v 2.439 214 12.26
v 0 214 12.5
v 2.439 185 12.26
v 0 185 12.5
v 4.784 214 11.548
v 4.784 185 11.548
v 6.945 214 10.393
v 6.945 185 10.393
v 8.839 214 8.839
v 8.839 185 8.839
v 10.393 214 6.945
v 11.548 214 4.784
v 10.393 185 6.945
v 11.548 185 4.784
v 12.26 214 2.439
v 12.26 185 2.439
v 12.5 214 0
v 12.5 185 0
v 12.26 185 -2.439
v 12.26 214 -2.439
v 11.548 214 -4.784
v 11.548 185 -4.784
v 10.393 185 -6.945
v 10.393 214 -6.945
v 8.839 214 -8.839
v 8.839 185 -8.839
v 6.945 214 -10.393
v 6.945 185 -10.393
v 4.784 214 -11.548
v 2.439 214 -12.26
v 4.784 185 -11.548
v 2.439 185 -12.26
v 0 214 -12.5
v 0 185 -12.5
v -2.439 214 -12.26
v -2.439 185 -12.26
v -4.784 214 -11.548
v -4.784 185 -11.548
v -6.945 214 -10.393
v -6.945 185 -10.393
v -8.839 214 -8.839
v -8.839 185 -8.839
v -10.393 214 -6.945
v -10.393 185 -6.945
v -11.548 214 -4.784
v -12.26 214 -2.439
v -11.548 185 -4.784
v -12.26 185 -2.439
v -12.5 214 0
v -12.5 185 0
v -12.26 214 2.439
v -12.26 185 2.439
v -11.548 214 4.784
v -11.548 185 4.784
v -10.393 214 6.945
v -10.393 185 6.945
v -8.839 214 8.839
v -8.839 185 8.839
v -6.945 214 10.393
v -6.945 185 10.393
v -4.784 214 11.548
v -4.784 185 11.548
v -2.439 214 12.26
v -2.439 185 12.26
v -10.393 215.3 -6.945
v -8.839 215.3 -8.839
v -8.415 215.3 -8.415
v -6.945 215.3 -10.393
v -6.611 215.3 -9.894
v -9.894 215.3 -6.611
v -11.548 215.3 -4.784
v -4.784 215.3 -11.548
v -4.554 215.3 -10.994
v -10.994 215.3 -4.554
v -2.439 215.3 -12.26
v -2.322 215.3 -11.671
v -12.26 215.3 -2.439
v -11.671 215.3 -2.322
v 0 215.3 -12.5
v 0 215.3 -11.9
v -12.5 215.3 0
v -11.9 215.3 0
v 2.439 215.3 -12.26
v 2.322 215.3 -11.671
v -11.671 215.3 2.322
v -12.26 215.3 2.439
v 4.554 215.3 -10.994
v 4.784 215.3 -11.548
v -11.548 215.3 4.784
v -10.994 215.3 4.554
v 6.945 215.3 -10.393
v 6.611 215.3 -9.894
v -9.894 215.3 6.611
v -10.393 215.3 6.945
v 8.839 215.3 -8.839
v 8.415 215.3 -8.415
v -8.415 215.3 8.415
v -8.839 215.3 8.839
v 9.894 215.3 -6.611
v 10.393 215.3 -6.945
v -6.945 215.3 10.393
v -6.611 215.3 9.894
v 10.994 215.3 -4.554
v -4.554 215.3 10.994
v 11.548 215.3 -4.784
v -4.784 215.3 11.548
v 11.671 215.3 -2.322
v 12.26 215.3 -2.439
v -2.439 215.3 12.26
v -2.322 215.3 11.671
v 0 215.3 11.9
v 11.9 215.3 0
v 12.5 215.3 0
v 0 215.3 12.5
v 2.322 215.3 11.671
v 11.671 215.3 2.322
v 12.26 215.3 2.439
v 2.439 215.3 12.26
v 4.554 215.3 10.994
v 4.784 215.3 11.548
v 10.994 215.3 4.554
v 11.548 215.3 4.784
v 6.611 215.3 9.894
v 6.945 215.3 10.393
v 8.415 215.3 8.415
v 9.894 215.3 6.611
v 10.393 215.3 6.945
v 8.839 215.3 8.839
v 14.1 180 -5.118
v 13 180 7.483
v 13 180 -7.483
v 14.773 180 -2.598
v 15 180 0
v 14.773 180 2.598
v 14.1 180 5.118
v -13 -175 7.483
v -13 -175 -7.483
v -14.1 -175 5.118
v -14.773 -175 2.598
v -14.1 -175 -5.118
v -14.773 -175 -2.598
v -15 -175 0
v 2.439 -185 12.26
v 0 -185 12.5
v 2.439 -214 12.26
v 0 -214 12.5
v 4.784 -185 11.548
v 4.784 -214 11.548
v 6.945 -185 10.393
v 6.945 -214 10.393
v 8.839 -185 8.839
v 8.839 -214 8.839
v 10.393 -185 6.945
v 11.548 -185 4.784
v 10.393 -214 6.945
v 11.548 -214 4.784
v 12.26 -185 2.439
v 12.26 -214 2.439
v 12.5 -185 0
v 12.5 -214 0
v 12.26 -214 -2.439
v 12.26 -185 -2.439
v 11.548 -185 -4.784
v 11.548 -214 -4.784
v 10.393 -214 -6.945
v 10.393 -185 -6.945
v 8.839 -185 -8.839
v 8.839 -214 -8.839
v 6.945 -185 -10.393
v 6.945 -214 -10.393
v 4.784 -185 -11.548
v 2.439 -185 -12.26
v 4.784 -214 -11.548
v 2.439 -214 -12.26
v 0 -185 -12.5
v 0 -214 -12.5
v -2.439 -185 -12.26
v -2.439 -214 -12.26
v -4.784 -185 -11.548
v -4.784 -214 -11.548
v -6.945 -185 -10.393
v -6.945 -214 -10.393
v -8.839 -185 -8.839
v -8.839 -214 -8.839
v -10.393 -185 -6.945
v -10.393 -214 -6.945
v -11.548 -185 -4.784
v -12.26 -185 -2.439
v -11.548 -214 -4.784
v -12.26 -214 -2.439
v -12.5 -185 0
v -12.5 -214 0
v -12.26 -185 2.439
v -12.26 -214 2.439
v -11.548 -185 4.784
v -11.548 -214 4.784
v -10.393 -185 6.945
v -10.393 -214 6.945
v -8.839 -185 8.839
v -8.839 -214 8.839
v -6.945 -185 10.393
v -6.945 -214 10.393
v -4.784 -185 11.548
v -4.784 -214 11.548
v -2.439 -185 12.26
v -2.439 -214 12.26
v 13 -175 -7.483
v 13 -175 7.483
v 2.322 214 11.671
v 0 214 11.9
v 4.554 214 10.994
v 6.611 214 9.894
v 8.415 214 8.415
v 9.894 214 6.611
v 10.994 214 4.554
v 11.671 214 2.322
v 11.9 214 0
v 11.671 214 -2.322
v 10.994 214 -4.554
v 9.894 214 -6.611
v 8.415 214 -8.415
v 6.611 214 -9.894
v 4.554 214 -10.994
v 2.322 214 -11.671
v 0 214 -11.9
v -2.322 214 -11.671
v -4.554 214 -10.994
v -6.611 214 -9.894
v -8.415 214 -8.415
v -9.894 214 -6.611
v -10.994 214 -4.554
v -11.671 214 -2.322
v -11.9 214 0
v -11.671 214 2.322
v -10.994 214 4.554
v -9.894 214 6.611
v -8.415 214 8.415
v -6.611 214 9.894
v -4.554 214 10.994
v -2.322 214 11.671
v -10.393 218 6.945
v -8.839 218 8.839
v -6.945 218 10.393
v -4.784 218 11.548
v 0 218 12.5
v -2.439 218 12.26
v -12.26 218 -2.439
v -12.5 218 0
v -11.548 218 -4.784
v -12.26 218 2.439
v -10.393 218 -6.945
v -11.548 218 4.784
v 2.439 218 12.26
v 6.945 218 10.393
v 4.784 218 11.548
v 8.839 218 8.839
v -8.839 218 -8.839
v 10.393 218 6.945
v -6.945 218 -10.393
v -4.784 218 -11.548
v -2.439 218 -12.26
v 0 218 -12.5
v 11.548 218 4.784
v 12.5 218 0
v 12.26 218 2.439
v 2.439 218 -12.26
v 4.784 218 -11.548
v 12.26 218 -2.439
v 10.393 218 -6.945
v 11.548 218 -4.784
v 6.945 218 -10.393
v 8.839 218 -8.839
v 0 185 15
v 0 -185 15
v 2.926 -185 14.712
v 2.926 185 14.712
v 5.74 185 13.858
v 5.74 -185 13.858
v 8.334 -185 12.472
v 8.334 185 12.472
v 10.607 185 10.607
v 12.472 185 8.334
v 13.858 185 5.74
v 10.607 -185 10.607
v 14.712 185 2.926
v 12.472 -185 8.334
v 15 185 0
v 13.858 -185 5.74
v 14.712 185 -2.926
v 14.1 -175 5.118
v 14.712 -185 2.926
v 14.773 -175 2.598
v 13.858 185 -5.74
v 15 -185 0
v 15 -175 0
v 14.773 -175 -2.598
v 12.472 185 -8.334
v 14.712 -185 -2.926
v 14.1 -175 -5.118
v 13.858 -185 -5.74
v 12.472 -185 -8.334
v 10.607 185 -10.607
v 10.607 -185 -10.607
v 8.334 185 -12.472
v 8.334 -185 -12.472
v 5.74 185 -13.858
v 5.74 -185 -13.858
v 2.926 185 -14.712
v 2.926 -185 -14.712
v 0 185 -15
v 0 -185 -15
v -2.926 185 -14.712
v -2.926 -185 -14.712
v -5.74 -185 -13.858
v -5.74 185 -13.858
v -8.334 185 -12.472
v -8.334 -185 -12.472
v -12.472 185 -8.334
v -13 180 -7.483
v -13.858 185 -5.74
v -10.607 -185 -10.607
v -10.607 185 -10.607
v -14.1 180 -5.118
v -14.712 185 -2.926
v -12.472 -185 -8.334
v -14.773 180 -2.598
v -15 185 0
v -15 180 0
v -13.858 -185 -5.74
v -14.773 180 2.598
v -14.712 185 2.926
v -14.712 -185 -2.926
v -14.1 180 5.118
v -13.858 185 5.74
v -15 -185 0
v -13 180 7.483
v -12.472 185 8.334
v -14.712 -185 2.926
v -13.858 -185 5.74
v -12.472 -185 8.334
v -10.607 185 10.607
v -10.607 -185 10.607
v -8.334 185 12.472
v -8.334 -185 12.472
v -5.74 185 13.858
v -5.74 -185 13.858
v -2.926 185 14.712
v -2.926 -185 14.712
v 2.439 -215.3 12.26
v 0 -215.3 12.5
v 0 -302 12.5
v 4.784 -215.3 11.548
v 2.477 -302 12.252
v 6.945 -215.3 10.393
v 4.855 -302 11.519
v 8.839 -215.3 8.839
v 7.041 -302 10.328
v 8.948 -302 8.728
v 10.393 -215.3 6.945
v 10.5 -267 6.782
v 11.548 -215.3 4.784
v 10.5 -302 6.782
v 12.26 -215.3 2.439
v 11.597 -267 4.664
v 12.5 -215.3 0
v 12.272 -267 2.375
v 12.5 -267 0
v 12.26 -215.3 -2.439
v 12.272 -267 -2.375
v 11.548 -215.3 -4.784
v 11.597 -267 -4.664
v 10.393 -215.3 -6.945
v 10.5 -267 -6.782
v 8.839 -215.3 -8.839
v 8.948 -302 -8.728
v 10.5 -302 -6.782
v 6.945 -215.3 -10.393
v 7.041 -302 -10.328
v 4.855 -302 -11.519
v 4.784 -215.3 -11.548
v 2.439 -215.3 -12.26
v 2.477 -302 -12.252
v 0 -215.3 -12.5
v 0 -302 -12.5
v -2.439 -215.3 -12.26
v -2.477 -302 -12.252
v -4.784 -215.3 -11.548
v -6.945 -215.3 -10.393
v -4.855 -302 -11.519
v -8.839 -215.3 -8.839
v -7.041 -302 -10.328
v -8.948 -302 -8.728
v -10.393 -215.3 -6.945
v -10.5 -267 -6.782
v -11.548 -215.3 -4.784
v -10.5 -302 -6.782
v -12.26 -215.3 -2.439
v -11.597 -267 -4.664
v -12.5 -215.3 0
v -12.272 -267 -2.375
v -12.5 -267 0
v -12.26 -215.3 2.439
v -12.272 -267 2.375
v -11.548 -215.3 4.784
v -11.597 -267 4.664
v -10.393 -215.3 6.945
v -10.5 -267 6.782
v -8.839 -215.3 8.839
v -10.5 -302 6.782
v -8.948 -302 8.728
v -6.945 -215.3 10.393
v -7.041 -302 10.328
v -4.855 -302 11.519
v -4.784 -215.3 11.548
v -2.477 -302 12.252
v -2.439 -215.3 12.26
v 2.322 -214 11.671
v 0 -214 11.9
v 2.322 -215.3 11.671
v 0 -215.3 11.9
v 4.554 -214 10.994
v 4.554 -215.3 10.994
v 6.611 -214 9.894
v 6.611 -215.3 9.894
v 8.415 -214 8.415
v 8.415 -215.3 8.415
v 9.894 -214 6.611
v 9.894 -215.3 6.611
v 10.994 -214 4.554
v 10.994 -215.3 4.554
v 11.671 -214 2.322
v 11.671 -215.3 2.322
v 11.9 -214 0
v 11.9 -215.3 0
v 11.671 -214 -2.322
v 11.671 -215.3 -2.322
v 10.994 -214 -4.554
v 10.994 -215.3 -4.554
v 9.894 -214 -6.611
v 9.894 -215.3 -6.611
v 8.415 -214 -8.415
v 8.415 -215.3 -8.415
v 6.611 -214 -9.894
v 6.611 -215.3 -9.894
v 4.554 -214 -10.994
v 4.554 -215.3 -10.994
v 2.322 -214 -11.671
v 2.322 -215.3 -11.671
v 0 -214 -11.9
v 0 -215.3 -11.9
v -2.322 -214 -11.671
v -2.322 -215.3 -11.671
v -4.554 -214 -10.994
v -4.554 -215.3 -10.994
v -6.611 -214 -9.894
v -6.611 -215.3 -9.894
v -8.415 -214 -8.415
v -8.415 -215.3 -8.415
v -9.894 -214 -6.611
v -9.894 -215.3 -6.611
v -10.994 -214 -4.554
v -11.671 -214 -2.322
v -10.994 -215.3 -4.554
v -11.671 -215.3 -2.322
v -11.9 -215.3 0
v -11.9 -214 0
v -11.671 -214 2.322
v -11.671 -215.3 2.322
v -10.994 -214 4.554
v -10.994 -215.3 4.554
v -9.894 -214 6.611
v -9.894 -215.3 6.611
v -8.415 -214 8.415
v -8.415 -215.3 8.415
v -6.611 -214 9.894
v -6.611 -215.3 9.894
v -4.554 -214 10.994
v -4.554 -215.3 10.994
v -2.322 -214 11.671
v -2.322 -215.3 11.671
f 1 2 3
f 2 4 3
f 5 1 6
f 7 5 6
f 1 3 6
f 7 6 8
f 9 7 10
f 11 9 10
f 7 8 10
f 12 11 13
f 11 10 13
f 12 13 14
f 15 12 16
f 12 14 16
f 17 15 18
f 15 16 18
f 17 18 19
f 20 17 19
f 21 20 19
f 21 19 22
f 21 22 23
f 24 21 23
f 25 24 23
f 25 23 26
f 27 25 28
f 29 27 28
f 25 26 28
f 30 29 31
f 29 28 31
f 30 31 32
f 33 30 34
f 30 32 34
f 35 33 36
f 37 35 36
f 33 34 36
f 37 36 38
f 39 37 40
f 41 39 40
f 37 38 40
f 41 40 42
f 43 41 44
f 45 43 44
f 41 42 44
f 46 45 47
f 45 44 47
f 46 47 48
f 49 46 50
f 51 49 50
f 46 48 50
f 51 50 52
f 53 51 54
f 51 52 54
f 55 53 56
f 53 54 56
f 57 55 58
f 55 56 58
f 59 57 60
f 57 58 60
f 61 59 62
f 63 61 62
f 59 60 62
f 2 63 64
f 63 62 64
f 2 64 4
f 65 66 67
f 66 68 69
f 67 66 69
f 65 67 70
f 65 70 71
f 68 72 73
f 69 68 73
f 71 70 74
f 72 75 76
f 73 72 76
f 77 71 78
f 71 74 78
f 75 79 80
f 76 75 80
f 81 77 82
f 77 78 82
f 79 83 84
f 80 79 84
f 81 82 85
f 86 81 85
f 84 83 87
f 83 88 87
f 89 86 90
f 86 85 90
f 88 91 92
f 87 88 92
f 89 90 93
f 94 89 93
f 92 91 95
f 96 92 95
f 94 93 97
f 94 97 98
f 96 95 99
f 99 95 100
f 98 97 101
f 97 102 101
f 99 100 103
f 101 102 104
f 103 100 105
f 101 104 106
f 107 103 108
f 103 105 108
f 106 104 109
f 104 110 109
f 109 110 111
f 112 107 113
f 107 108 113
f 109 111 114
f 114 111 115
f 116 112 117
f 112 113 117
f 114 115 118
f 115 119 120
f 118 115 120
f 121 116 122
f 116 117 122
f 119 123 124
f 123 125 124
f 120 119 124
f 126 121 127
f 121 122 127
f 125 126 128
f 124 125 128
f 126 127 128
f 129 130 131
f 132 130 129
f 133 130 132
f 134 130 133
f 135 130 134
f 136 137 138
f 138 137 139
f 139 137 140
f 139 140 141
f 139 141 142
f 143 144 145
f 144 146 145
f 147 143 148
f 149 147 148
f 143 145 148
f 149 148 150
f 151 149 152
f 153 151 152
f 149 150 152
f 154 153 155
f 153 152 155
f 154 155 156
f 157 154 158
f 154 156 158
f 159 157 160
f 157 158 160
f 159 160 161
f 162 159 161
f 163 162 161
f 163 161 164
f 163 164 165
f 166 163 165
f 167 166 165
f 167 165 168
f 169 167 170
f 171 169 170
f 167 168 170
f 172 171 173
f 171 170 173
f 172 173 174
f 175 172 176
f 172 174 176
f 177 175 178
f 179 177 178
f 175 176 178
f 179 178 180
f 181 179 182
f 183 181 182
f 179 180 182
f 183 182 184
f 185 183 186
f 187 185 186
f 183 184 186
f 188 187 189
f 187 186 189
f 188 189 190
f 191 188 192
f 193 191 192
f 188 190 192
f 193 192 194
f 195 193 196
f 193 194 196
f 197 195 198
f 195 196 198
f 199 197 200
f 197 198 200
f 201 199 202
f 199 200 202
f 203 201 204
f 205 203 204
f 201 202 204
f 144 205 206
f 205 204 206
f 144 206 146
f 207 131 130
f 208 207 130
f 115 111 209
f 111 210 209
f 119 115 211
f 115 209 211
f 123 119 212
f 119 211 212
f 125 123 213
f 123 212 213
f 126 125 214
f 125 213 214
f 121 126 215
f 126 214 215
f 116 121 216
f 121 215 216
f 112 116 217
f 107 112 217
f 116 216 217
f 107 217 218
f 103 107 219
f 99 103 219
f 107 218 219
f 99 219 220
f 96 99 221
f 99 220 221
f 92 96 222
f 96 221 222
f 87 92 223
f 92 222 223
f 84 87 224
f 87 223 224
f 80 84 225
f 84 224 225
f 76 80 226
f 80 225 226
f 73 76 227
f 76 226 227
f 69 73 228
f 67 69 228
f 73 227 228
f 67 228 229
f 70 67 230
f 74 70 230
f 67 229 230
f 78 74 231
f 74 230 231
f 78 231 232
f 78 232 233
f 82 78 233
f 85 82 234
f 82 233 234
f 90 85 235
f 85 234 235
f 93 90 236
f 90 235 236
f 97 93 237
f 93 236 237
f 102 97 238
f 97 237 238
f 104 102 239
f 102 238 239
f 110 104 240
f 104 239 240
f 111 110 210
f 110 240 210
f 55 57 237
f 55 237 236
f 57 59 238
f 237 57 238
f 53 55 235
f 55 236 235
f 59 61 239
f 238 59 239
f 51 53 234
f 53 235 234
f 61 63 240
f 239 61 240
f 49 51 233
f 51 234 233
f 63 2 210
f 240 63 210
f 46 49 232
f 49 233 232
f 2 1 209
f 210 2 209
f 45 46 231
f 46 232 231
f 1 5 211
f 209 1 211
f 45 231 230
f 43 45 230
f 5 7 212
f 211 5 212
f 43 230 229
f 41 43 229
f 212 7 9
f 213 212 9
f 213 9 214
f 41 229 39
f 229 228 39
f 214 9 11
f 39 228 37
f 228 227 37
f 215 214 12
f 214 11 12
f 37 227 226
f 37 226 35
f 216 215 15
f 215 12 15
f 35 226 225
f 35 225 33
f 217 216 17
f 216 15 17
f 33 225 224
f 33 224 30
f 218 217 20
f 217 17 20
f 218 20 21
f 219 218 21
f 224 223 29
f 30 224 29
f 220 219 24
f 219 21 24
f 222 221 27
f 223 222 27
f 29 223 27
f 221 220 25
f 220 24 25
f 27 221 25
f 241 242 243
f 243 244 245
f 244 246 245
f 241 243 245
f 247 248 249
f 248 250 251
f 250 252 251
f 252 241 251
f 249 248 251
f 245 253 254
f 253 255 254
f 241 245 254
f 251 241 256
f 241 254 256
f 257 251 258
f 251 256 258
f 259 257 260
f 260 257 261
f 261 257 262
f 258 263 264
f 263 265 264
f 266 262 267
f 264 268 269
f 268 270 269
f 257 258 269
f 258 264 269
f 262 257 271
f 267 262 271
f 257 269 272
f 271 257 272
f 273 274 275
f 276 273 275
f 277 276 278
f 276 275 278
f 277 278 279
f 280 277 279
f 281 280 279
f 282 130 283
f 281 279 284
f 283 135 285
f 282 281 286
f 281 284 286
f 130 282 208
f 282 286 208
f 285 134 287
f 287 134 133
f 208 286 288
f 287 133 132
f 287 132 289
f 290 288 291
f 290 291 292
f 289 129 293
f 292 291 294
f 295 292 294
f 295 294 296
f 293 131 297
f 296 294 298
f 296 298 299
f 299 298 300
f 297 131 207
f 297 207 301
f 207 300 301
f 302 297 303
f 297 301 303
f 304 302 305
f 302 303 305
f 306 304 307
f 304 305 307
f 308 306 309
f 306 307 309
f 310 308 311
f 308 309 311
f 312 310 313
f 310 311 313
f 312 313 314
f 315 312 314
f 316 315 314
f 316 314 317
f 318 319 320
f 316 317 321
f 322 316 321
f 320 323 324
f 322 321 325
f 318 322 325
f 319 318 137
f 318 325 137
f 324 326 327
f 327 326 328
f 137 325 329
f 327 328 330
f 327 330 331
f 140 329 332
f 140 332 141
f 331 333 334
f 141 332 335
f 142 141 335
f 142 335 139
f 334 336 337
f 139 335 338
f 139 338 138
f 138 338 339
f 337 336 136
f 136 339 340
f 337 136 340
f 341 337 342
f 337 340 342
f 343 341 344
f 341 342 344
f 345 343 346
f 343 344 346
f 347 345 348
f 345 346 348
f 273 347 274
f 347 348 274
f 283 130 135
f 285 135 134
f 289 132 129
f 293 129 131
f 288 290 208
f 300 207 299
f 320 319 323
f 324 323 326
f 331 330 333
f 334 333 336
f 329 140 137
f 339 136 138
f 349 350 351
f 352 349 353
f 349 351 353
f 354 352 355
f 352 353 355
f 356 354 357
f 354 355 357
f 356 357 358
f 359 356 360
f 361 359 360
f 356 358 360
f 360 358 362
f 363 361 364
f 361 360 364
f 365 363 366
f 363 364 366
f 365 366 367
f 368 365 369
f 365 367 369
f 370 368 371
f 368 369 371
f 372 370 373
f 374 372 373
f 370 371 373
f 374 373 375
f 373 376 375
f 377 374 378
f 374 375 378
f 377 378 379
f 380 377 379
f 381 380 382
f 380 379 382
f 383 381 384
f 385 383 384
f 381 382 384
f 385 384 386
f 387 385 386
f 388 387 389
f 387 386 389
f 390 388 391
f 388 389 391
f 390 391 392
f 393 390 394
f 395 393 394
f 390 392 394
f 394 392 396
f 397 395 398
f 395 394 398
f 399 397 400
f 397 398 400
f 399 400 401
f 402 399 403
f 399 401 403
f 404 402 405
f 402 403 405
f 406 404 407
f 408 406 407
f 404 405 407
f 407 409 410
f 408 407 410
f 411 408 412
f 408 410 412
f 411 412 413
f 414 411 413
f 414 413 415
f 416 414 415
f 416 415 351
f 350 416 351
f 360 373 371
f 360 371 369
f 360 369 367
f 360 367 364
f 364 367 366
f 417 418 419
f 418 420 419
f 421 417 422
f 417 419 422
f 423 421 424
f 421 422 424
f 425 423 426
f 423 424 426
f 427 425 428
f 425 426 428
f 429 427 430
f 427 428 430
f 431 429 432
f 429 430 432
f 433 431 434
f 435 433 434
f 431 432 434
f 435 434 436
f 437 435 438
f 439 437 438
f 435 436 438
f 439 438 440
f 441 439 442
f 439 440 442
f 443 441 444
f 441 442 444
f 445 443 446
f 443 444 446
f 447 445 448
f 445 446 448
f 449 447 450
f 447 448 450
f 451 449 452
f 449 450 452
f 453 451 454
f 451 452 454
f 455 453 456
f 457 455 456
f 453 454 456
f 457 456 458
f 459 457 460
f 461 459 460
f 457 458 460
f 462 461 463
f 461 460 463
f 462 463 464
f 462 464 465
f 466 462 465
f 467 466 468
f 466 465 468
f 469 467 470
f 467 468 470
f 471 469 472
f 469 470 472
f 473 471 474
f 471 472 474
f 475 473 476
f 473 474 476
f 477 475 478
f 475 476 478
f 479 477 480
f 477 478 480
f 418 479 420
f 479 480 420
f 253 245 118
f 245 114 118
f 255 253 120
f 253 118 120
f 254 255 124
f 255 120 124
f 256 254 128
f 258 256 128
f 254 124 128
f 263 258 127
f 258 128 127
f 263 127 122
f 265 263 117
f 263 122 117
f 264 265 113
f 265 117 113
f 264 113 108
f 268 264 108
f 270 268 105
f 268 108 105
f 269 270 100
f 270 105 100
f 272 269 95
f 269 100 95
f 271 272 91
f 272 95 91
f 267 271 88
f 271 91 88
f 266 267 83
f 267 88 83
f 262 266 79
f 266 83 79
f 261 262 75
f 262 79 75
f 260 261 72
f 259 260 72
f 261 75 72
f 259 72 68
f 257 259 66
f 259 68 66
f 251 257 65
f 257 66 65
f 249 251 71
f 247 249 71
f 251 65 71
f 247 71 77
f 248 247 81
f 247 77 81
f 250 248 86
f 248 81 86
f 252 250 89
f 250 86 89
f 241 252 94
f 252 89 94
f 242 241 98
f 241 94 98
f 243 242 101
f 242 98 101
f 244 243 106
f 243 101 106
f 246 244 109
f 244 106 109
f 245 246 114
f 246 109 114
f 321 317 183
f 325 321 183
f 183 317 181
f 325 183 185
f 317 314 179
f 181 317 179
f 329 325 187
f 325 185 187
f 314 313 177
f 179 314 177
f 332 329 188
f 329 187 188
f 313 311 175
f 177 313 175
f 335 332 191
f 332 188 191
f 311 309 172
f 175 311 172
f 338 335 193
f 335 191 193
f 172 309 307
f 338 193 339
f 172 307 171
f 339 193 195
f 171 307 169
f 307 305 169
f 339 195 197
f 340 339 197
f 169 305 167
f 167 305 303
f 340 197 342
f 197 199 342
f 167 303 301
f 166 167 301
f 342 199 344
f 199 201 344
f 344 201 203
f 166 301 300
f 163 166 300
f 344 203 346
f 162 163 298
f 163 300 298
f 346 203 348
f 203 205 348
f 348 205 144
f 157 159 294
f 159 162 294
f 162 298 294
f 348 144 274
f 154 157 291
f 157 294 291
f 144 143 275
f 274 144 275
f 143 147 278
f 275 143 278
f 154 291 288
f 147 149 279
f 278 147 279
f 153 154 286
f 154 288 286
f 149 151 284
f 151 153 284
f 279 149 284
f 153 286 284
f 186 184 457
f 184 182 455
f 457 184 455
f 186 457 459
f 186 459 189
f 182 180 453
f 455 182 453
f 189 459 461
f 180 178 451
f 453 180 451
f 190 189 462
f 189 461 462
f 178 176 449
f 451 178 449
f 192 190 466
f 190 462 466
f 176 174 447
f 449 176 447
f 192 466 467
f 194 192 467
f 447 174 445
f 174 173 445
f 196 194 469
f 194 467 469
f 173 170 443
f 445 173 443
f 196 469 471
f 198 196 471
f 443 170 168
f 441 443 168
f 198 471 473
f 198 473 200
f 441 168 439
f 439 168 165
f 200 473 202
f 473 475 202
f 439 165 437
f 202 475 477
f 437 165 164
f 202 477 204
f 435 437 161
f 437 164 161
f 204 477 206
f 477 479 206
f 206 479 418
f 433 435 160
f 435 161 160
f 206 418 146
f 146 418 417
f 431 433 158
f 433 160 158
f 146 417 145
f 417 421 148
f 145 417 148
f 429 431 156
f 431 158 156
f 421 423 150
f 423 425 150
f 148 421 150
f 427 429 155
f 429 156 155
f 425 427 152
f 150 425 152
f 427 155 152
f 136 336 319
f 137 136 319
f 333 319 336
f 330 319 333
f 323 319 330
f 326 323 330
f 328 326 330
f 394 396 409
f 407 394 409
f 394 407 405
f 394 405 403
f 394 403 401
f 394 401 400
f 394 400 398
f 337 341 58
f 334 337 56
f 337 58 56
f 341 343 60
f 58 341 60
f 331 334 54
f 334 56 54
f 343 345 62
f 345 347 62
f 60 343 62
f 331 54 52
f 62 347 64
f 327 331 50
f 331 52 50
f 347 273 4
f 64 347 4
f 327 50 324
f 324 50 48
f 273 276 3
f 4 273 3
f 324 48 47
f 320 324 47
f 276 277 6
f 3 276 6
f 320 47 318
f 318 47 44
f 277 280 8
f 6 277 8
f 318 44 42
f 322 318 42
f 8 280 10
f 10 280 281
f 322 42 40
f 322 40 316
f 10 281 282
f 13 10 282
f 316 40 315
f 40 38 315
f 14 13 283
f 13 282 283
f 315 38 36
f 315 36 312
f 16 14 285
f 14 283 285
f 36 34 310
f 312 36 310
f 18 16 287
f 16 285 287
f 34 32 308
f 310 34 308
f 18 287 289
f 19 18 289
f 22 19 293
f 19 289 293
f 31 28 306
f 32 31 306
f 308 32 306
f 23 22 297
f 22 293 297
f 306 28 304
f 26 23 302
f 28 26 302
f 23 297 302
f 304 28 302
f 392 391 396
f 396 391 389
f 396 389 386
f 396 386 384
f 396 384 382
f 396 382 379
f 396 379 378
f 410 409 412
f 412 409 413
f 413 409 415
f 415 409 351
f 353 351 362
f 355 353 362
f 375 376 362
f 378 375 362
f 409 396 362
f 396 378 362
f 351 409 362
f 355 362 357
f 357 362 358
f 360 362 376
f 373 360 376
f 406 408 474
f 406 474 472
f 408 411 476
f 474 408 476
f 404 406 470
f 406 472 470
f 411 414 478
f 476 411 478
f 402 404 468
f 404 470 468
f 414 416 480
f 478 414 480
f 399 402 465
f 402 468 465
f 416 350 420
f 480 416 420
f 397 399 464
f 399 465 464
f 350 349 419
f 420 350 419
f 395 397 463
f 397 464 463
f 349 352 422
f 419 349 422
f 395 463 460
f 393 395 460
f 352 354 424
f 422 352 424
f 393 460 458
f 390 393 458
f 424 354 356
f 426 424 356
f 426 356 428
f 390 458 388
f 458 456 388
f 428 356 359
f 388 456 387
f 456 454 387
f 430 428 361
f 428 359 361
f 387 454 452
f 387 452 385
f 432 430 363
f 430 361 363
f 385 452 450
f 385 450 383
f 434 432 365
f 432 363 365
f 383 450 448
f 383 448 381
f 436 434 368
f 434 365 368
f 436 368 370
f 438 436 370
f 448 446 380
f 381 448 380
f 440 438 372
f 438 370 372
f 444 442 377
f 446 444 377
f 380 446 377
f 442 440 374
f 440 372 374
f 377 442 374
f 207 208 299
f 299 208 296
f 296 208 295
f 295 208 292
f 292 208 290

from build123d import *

# Parameters (mm, degrees)
F3_DEPTH = 35
F5_START = -5
F5_DEPTH = 355


with BuildPart() as f1:
    # F0 (on Right) → F1 (revolve)
    with BuildSketch(Plane.YZ):
        Polygon((-185, 0), (-185, 12.5), (-214, 12.5), (-214, 11.9), (-215.3, 11.9), (-215.3, 12.5), (-302, 12.5), (-302, 0), align=None)
        Polygon((185, 12.5), (185, 15), (-185, 15), (-185, 12.5), (-185, 0), (185, 0), align=None)
        Polygon((214, 12.5), (185, 12.5), (185, 0), (218, 0), (218, 12.5), (215.3, 12.5), (215.3, 11.9), (214, 11.9), align=None)
    revolve(axis=Axis((0, -30.9201925993, 0), (0, 1, 0)))

    # F2 (on face) → F3 (cut)
    with BuildSketch(Plane.XZ.offset(302)):
        with BuildLine():
            Line((-10.5, -6.7823299831), (-10.5, 6.7823299831))
            ThreePointArc((-10.5, 6.7823299831), (-12.5, 0), (-10.5, -6.7823299831))
        make_face()
        with BuildLine():
            ThreePointArc((12.5, 0), (11.9895788083, 3.5355339059), (10.5, 6.7823299831))
            Line((10.5, 6.7823299831), (10.5, -6.7823299831))
            ThreePointArc((10.5, -6.7823299831), (11.9895788083, -3.5355339059), (12.5, 0))
        make_face()
    extrude(amount=-F3_DEPTH, mode=Mode.SUBTRACT)

    # F4 (on face) → F5 (cut)
    with BuildSketch(Plane(origin=(0, 185, 0), x_dir=(-1, 0, 0), z_dir=(0, 1, 0)).offset(F5_START)):
        with BuildLine():
            Line((-13, -7.4833147735), (-13, 7.4833147735))
            ThreePointArc((-13, 7.4833147735), (-15, 0), (-13, -7.4833147735))
        make_face()
        with BuildLine():
            ThreePointArc((13, -7.4833147735), (15, 0), (13, 7.4833147735))
            Line((13, 7.4833147735), (13, -7.4833147735))
        make_face()
    extrude(amount=-F5_DEPTH, mode=Mode.SUBTRACT)


solid = f1.part
